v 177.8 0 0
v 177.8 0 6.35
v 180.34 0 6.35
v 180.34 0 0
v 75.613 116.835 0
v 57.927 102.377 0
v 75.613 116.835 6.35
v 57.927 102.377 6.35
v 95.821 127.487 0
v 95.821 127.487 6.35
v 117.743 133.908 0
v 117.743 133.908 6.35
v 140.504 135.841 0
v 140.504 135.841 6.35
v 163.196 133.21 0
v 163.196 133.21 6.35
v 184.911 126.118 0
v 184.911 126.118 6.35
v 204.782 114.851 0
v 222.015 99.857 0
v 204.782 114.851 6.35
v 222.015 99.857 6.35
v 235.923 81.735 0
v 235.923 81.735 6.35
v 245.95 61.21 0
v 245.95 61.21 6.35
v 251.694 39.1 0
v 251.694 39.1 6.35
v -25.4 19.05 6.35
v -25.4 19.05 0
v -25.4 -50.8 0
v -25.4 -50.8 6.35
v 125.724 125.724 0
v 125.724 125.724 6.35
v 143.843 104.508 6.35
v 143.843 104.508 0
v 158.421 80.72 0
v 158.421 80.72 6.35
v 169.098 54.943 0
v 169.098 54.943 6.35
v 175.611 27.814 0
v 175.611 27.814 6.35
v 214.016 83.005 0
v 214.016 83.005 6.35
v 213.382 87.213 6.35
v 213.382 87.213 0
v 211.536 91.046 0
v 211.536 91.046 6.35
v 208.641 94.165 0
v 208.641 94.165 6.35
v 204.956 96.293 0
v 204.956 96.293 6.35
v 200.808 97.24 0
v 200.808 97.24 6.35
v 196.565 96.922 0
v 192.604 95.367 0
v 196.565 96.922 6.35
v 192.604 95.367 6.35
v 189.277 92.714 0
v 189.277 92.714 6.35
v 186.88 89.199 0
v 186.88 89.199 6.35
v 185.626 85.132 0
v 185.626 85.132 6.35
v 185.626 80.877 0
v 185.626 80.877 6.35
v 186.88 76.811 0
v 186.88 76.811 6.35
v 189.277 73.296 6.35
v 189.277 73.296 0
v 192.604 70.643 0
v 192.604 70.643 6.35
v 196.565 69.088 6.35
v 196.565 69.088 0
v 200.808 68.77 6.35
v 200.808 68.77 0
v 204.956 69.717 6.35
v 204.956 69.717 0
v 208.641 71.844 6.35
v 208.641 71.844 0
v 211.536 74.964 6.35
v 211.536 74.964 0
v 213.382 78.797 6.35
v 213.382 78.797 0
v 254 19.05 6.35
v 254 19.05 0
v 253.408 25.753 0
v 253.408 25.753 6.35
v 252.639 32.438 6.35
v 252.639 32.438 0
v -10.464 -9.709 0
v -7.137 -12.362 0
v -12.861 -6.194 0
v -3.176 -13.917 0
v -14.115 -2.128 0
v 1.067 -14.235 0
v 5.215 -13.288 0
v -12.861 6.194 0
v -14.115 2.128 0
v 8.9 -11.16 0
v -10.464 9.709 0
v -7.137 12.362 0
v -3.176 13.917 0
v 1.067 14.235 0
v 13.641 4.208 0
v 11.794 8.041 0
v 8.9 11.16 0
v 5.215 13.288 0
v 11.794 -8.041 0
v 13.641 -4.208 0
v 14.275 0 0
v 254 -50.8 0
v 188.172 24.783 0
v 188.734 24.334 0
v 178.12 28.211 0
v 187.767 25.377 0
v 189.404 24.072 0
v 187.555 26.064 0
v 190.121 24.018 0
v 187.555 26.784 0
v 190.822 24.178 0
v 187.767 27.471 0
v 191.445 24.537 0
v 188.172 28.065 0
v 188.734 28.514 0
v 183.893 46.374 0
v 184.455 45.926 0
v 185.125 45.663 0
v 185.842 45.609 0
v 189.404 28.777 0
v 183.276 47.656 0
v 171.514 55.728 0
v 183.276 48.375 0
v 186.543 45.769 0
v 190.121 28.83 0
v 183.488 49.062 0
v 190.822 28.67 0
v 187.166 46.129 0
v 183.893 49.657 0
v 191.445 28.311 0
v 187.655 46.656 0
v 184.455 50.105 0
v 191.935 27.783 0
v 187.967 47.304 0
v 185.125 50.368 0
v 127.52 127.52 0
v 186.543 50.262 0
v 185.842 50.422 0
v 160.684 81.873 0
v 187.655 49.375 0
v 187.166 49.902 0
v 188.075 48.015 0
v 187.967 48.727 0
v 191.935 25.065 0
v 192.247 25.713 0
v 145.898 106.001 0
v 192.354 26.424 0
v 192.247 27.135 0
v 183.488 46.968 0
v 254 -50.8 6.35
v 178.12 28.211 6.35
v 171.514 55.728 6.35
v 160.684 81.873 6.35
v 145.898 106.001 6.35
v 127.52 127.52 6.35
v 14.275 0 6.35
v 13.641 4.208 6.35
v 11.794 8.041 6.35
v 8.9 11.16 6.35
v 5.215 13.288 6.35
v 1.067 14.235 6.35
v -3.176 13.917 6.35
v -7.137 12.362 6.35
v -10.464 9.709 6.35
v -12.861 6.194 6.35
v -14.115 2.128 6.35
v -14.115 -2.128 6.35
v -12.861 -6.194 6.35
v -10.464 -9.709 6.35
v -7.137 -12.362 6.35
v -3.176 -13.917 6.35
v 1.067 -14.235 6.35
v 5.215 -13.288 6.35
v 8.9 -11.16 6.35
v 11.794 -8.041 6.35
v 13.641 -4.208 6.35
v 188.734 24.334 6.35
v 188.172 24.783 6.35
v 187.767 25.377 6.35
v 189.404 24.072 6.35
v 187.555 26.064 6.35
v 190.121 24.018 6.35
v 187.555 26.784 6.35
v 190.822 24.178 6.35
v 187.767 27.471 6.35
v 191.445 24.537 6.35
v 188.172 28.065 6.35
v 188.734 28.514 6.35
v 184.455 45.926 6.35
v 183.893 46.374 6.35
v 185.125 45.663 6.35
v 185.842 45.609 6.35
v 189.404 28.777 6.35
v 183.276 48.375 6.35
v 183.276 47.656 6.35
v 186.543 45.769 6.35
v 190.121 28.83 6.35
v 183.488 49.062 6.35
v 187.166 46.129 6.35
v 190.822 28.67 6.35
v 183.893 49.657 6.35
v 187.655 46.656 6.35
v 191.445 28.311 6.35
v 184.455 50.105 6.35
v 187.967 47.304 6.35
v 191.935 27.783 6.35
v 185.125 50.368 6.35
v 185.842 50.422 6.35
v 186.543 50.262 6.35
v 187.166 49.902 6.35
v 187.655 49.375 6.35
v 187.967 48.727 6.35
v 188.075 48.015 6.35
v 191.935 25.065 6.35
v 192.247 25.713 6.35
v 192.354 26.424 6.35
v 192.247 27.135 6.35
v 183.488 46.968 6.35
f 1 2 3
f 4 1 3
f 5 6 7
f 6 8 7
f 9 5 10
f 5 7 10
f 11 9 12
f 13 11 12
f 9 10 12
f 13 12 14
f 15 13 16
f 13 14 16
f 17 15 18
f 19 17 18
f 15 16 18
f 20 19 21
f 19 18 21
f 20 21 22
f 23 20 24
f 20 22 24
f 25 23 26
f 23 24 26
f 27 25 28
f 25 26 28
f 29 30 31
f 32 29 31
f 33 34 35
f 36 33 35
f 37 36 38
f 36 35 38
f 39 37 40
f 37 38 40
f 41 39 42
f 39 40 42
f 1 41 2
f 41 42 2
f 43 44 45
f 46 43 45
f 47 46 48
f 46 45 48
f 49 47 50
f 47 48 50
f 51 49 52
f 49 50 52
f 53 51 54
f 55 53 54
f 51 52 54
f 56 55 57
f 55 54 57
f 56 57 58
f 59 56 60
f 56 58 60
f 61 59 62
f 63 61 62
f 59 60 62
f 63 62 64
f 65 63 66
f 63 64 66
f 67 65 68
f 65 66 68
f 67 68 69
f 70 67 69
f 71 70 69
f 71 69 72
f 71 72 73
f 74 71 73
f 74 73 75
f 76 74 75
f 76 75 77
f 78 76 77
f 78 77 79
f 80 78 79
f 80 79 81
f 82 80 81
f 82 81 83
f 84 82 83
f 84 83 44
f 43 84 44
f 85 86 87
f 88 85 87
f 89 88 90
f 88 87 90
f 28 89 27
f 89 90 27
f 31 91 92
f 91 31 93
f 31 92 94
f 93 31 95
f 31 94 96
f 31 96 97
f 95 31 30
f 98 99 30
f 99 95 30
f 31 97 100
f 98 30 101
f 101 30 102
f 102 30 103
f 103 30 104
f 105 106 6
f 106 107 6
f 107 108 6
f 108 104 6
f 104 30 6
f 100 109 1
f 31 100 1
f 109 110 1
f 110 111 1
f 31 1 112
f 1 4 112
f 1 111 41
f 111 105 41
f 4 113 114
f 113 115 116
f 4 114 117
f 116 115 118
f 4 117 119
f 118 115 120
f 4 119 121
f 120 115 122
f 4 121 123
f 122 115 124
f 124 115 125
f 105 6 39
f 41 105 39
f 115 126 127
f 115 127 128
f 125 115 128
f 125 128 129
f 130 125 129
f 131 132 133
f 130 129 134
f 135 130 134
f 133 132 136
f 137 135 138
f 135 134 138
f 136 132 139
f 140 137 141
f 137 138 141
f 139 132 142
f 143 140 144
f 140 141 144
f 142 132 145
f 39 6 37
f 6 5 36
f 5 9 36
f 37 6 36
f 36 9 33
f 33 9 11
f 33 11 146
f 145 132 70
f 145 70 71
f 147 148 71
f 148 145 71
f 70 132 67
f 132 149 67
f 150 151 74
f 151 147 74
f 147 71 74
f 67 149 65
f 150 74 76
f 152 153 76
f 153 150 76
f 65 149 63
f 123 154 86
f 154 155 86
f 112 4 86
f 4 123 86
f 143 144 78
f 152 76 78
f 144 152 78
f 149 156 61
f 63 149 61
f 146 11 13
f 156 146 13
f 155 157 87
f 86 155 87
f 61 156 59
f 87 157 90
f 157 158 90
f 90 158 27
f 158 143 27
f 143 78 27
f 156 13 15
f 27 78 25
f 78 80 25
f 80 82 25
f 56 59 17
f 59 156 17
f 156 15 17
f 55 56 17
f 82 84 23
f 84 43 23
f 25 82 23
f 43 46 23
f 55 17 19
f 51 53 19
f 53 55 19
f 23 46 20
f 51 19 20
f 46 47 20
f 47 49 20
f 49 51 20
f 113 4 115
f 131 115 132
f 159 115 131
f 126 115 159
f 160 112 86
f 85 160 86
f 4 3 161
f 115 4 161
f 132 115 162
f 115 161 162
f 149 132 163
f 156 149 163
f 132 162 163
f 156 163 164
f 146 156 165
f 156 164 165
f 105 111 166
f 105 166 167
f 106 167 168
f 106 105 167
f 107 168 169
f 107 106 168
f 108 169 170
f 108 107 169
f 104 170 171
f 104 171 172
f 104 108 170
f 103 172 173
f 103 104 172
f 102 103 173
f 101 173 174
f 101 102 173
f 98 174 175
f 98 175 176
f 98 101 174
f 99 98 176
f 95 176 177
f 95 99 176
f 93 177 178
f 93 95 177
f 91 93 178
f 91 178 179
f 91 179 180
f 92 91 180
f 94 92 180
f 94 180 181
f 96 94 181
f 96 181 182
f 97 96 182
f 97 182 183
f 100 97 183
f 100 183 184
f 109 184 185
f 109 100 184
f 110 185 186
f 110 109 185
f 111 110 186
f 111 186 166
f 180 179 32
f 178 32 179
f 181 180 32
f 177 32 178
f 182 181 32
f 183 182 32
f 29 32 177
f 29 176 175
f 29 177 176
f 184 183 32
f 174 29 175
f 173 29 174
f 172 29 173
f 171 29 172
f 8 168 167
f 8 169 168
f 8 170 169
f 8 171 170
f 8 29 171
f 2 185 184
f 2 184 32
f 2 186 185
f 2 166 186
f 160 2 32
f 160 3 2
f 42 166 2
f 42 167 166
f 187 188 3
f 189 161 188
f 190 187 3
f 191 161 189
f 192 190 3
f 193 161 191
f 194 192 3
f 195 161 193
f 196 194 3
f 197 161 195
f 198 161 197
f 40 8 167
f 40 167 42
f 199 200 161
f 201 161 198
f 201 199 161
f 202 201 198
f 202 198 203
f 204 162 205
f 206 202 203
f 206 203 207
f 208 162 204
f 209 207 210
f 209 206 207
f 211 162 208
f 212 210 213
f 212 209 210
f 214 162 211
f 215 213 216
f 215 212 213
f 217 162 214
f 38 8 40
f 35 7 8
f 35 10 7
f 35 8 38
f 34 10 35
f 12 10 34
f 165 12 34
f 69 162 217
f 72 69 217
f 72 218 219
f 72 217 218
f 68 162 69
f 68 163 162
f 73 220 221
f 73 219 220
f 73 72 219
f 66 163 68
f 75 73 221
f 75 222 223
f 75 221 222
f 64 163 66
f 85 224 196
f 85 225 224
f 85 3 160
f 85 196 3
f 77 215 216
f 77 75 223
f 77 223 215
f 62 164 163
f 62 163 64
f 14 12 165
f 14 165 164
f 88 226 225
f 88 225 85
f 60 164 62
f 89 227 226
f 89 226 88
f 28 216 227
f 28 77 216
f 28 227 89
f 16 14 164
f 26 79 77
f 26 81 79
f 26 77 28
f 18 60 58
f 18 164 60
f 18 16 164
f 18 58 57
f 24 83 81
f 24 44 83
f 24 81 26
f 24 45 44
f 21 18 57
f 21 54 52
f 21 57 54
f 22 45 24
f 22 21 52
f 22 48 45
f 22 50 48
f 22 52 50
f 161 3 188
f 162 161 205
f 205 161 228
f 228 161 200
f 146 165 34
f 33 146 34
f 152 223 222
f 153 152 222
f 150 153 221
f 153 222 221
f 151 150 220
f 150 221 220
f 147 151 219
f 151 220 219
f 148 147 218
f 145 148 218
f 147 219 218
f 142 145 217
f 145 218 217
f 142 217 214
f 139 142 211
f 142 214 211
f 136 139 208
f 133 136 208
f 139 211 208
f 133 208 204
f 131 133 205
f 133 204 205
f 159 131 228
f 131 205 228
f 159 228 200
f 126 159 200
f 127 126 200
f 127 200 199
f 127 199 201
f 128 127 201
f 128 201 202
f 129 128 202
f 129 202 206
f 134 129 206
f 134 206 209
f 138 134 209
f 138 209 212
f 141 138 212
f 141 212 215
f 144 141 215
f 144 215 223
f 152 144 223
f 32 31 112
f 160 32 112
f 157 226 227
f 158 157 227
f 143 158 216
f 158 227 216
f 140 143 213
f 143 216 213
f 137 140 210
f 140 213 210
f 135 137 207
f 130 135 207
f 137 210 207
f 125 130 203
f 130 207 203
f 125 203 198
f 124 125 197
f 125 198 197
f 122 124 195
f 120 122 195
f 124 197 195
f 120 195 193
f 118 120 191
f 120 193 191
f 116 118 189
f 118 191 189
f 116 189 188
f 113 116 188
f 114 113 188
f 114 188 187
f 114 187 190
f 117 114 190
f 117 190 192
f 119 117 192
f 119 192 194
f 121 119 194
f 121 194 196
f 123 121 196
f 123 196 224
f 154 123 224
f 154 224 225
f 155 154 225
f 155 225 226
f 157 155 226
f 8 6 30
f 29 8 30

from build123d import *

# Parameters (mm, degrees)
SKETCH1_R               = 14.2748
BOSS_EXTRUDE1_DEPTH     = 6.35
CUT_EXTRUDE1_DEPTH      = 7.35
SKETCH3_R               = 14.2748
CUT_EXTRUDE2_DEPTH      = 7.35
SKETCH5_R               = 2.413
CUT_EXTRUDE3_DEPTH      = 1
CUT_EXTRUDE3_DEPTH_BACK = 7.35
FILLET1_R               = 114.3


with BuildPart() as part:
    # Sketch1 → Boss-Extrude1 (new body)
    with BuildSketch(Plane.XY):
        with BuildLine():
            Line((-25.4, -50.8), (254, -50.8))
            Line((254, -50.8), (254, 19.05))
            ThreePointArc((254, 19.05), (224.503557522, 120.320634806), (156.508042902, 200.958042902))
            Line((156.508042902, 200.958042902), (-25.4, 19.05))
            Line((-25.4, 19.05), (-25.4, -50.8))
        make_face()
        Circle(SKETCH1_R, mode=Mode.SUBTRACT)
    extrude(amount=BOSS_EXTRUDE1_DEPTH)

    # Sketch2 → Cut-Extrude1 (cut, through all)
    with BuildSketch(Plane.XY.offset(6.35)):
        with BuildLine():
            Line((127.519636919, 127.519636919), (125.723585695, 125.723585695))
            ThreePointArc((125.723585695, 125.723585695), (164.265780881, 68.041114275), (177.8, 0))
            Line((177.8, 0), (180.34, 0))
            ThreePointArc((180.34, 0), (166.612434893, 69.013130193), (127.519636919, 127.519636919))
        make_face()
    extrude(amount=-CUT_EXTRUDE1_DEPTH, mode=Mode.SUBTRACT)

    # Sketch3 → Cut-Extrude2 (cut, through all)
    with BuildSketch(Plane.XY.offset(6.35)):
        with Locations((199.741193703, 83.004946712)):
            Circle(SKETCH3_R)
    extrude(amount=-CUT_EXTRUDE2_DEPTH, mode=Mode.SUBTRACT)

    # Sketch5 → Cut-Extrude3 (cut, two sides)
    with BuildSketch(Plane.XY.offset(6.35)) as cut_extrude3_sk:
        with Locations((185.661672995, 48.015373378)):
            Circle(SKETCH5_R)
        with Locations((189.940787606, 26.424044045)):
            Circle(SKETCH5_R)
    extrude(amount=CUT_EXTRUDE3_DEPTH, mode=Mode.SUBTRACT)
    extrude(cut_extrude3_sk.sketch, amount=-CUT_EXTRUDE3_DEPTH_BACK, mode=Mode.SUBTRACT)

    # Fillet1
    fillet1_edges = [part.edges().sort_by_distance(p)[0] for p in [
        (156.508042902, 200.958042902, 3.175),
    ]]
    fillet(fillet1_edges, radius=FILLET1_R)


solid = part.part
